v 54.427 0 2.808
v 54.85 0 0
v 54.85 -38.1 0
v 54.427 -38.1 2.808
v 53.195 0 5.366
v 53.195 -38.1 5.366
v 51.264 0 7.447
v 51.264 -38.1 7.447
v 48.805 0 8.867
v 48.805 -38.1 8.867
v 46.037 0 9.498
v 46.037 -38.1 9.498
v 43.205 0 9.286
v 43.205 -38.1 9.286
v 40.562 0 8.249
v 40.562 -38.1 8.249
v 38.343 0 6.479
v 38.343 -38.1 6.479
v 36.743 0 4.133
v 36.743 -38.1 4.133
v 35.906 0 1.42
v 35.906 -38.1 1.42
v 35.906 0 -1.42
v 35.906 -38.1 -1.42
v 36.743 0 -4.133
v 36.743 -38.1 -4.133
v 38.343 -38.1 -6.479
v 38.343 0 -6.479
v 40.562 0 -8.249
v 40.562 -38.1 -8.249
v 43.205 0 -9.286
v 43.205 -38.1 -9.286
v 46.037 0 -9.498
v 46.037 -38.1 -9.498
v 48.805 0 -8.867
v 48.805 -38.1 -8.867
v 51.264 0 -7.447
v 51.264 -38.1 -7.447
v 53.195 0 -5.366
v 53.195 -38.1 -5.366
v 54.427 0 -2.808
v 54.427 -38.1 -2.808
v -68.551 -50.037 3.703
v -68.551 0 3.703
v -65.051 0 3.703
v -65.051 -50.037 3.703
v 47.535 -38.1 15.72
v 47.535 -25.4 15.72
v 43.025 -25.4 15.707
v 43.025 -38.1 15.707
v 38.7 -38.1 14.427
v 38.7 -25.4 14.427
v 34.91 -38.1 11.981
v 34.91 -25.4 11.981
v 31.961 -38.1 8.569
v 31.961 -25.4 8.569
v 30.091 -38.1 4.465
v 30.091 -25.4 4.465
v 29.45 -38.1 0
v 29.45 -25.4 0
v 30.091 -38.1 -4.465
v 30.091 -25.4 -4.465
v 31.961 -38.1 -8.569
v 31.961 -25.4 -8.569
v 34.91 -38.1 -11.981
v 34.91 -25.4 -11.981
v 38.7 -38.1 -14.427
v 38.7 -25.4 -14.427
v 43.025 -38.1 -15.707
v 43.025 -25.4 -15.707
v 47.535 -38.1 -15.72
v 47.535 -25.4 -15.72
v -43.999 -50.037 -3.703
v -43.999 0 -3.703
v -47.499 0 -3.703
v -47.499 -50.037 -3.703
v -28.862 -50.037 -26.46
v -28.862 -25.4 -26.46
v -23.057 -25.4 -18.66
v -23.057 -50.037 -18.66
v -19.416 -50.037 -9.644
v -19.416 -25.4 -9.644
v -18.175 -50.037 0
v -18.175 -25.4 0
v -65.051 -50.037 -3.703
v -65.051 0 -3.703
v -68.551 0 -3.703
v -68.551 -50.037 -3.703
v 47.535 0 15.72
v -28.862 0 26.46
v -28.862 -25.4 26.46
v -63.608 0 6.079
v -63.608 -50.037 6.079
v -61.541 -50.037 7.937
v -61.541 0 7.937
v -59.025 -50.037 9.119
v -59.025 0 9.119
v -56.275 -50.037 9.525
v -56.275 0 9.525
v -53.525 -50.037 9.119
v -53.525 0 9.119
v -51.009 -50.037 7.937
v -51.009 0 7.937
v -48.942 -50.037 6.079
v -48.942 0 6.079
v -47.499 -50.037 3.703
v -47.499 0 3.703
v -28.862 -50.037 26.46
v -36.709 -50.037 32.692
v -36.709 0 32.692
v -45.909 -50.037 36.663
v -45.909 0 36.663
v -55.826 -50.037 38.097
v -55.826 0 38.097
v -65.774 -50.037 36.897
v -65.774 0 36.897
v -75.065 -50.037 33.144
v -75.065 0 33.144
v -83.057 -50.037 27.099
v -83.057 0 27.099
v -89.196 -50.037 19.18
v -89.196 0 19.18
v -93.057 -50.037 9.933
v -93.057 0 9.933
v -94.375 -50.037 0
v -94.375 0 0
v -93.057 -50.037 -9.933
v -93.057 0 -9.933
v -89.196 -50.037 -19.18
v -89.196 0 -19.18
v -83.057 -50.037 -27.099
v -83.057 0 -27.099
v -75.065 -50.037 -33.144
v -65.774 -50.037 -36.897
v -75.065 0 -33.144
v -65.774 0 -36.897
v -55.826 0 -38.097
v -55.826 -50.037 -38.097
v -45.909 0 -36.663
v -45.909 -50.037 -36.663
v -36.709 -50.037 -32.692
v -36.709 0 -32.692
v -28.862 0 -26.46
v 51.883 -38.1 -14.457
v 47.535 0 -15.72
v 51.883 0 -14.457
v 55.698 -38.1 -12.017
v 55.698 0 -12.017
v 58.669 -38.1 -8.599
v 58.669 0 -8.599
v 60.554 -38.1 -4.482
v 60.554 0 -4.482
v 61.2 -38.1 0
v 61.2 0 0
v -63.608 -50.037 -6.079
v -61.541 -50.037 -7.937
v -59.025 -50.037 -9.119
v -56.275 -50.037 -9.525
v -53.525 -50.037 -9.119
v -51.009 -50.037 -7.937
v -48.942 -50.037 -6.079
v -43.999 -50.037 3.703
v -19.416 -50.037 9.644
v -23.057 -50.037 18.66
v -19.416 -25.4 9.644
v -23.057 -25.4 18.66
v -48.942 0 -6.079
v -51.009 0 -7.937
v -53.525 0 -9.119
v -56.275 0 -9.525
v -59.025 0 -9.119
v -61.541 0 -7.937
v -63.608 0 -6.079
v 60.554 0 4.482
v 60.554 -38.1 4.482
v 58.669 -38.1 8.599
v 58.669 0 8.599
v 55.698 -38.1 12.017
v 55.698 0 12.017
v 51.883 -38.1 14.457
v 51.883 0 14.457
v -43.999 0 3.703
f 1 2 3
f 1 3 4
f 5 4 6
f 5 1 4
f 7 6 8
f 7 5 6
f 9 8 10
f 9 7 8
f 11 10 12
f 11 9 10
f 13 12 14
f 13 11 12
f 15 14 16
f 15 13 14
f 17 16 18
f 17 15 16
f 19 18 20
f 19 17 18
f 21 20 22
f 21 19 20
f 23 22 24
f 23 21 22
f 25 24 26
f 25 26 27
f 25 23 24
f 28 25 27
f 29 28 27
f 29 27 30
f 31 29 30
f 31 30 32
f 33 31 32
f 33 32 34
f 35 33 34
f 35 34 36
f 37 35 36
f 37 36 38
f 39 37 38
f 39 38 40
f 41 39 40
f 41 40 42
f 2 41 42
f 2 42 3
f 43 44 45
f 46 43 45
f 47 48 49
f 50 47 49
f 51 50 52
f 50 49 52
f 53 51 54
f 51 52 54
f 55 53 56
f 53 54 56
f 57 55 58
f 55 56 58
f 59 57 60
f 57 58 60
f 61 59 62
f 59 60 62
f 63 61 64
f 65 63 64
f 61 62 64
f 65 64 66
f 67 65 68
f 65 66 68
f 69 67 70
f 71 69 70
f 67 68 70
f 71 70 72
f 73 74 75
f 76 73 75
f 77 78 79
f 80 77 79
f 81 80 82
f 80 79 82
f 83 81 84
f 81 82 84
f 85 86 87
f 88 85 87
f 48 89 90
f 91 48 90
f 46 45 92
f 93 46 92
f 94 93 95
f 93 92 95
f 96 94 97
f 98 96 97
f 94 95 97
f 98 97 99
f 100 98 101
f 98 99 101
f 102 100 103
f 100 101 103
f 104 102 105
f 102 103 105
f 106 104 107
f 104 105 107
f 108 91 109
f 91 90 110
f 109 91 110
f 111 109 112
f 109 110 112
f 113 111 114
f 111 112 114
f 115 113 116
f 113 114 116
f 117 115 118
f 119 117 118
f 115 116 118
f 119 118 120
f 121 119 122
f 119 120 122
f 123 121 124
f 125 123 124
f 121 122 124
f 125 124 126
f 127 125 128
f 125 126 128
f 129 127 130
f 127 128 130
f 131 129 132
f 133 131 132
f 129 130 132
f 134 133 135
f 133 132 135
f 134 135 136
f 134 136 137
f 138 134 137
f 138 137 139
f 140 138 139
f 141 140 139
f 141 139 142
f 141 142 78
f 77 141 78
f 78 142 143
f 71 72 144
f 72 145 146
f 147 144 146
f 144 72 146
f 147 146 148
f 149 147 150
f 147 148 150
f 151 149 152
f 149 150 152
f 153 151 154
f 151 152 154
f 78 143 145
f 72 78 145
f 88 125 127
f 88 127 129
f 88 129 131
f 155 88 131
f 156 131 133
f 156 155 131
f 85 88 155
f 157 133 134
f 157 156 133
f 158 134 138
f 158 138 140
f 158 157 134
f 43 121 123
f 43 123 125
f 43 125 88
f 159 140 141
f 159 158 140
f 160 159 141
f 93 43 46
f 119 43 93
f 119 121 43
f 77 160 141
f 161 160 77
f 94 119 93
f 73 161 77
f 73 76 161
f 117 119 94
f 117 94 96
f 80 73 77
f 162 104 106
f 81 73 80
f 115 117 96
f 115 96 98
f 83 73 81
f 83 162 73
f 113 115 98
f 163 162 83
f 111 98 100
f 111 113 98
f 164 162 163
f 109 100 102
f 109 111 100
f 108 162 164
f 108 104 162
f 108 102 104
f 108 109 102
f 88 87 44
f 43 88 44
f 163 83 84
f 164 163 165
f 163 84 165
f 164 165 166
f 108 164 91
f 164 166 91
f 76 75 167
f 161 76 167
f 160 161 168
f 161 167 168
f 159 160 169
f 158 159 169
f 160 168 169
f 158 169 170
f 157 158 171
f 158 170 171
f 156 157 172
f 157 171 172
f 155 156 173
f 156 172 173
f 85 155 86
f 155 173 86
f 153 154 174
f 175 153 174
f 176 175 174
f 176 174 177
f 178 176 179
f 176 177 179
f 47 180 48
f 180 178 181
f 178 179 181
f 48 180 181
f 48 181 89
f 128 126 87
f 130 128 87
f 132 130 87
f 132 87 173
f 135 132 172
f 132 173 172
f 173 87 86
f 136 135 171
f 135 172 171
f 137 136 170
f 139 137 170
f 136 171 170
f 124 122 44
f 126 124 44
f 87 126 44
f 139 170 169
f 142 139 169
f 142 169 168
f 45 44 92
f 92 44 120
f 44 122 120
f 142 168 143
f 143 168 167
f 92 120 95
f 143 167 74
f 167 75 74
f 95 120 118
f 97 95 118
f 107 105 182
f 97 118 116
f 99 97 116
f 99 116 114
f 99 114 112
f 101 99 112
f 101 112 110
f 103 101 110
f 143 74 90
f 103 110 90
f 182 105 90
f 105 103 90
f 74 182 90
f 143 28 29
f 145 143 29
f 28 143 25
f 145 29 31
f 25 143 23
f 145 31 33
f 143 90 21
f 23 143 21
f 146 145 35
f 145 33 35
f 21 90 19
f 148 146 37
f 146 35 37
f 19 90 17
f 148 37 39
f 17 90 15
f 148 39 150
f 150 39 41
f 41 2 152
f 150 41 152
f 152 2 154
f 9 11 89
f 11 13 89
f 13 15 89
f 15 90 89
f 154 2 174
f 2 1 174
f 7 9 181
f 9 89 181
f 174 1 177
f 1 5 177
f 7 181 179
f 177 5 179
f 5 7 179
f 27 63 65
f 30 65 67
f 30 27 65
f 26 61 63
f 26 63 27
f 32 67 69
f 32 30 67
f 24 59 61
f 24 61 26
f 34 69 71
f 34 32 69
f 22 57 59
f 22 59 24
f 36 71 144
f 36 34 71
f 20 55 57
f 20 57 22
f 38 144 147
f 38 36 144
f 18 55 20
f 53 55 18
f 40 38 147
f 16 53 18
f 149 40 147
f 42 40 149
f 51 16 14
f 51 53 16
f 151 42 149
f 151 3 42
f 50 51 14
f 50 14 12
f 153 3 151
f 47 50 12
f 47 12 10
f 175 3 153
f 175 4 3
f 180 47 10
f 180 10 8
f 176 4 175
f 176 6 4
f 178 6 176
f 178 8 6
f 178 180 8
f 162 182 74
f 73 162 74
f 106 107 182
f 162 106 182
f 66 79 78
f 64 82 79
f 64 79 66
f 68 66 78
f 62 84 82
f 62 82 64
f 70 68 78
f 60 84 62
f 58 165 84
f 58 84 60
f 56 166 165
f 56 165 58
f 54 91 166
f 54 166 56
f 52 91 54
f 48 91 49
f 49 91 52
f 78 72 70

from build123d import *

# Parameters (mm, degrees)
F0_R     = 9.525
F1_DEPTH = 25.4
F2_DEPTH = 50.03695
F3_DEPTH = 38.1


with BuildPart() as f1:
    # F0 (on Front) → F1 (new body)
    with BuildSketch(Plane.XZ):
        with BuildLine():
            ThreePointArc((-28.862271, 26.460221), (-20.947828, 14.268476), (-18.175163, 0))
            ThreePointArc((-18.175163, 0), (-20.947828, -14.268476), (-28.862271, -26.460221))
            Line((-28.862271, -26.460221), (47.534793, -15.720424))
            ThreePointArc((47.534793, -15.720424), (29.449837, 0), (47.534793, 15.720424))
            Line((47.534793, 15.720424), (-28.862271, 26.460221))
        make_face()
        with BuildLine():
            ThreePointArc((61.199837, 0), (57.306044, 10.414715), (47.534793, 15.720424))
            ThreePointArc((47.534793, 15.720424), (29.449837, 0), (47.534793, -15.720424))
            ThreePointArc((47.534793, -15.720424), (57.306044, -10.414715), (61.199837, 0))
        make_face()
        with Locations((45.324837, 0)):
            Circle(F0_R, mode=Mode.SUBTRACT)
        with BuildLine():
            ThreePointArc((-28.862271, -26.460221), (-20.947828, -14.268476), (-18.175163, 0))
            ThreePointArc((-18.175163, 0), (-20.947828, 14.268476), (-28.862271, 26.460221))
            ThreePointArc((-28.862271, 26.460221), (-94.375163, 0), (-28.862271, -26.460221))
        make_face()
        with BuildLine():
            ThreePointArc((-65.050929, 3.702913), (-56.275163, 9.525), (-47.499398, 3.702913))
            Line((-47.499398, 3.702913), (-43.999273, 3.702913))
            Line((-43.999273, 3.702913), (-43.999273, -3.702913))
            Line((-43.999273, -3.702913), (-47.499398, -3.702913))
            ThreePointArc((-47.499398, -3.702913), (-56.275163, -9.525), (-65.050929, -3.702913))
            Line((-65.050929, -3.702913), (-68.551053, -3.702913))
            Line((-68.551053, -3.702913), (-68.551053, 3.702913))
            Line((-68.551053, 3.702913), (-65.050929, 3.702913))
        make_face(mode=Mode.SUBTRACT)
    extrude(amount=F1_DEPTH)

    # F0 (on Front) → F2 (join)
    with BuildSketch(Plane.XZ):
        with BuildLine():
            ThreePointArc((-28.862271, -26.460221), (-20.947828, -14.268476), (-18.175163, 0))
            ThreePointArc((-18.175163, 0), (-20.947828, 14.268476), (-28.862271, 26.460221))
            ThreePointArc((-28.862271, 26.460221), (-94.375163, 0), (-28.862271, -26.460221))
        make_face()
        with BuildLine():
            ThreePointArc((-65.050929, 3.702913), (-56.275163, 9.525), (-47.499398, 3.702913))
            Line((-47.499398, 3.702913), (-43.999273, 3.702913))
            Line((-43.999273, 3.702913), (-43.999273, -3.702913))
            Line((-43.999273, -3.702913), (-47.499398, -3.702913))
            ThreePointArc((-47.499398, -3.702913), (-56.275163, -9.525), (-65.050929, -3.702913))
            Line((-65.050929, -3.702913), (-68.551053, -3.702913))
            Line((-68.551053, -3.702913), (-68.551053, 3.702913))
            Line((-68.551053, 3.702913), (-65.050929, 3.702913))
        make_face(mode=Mode.SUBTRACT)
    extrude(amount=F2_DEPTH)

    # F0 (on Front) → F3 (join)
    with BuildSketch(Plane.XZ):
        with BuildLine():
            ThreePointArc((61.199837, 0), (57.306044, 10.414715), (47.534793, 15.720424))
            ThreePointArc((47.534793, 15.720424), (29.449837, 0), (47.534793, -15.720424))
            ThreePointArc((47.534793, -15.720424), (57.306044, -10.414715), (61.199837, 0))
        make_face()
        with Locations((45.324837, 0)):
            Circle(F0_R, mode=Mode.SUBTRACT)
    extrude(amount=F3_DEPTH)


solid = f1.part
